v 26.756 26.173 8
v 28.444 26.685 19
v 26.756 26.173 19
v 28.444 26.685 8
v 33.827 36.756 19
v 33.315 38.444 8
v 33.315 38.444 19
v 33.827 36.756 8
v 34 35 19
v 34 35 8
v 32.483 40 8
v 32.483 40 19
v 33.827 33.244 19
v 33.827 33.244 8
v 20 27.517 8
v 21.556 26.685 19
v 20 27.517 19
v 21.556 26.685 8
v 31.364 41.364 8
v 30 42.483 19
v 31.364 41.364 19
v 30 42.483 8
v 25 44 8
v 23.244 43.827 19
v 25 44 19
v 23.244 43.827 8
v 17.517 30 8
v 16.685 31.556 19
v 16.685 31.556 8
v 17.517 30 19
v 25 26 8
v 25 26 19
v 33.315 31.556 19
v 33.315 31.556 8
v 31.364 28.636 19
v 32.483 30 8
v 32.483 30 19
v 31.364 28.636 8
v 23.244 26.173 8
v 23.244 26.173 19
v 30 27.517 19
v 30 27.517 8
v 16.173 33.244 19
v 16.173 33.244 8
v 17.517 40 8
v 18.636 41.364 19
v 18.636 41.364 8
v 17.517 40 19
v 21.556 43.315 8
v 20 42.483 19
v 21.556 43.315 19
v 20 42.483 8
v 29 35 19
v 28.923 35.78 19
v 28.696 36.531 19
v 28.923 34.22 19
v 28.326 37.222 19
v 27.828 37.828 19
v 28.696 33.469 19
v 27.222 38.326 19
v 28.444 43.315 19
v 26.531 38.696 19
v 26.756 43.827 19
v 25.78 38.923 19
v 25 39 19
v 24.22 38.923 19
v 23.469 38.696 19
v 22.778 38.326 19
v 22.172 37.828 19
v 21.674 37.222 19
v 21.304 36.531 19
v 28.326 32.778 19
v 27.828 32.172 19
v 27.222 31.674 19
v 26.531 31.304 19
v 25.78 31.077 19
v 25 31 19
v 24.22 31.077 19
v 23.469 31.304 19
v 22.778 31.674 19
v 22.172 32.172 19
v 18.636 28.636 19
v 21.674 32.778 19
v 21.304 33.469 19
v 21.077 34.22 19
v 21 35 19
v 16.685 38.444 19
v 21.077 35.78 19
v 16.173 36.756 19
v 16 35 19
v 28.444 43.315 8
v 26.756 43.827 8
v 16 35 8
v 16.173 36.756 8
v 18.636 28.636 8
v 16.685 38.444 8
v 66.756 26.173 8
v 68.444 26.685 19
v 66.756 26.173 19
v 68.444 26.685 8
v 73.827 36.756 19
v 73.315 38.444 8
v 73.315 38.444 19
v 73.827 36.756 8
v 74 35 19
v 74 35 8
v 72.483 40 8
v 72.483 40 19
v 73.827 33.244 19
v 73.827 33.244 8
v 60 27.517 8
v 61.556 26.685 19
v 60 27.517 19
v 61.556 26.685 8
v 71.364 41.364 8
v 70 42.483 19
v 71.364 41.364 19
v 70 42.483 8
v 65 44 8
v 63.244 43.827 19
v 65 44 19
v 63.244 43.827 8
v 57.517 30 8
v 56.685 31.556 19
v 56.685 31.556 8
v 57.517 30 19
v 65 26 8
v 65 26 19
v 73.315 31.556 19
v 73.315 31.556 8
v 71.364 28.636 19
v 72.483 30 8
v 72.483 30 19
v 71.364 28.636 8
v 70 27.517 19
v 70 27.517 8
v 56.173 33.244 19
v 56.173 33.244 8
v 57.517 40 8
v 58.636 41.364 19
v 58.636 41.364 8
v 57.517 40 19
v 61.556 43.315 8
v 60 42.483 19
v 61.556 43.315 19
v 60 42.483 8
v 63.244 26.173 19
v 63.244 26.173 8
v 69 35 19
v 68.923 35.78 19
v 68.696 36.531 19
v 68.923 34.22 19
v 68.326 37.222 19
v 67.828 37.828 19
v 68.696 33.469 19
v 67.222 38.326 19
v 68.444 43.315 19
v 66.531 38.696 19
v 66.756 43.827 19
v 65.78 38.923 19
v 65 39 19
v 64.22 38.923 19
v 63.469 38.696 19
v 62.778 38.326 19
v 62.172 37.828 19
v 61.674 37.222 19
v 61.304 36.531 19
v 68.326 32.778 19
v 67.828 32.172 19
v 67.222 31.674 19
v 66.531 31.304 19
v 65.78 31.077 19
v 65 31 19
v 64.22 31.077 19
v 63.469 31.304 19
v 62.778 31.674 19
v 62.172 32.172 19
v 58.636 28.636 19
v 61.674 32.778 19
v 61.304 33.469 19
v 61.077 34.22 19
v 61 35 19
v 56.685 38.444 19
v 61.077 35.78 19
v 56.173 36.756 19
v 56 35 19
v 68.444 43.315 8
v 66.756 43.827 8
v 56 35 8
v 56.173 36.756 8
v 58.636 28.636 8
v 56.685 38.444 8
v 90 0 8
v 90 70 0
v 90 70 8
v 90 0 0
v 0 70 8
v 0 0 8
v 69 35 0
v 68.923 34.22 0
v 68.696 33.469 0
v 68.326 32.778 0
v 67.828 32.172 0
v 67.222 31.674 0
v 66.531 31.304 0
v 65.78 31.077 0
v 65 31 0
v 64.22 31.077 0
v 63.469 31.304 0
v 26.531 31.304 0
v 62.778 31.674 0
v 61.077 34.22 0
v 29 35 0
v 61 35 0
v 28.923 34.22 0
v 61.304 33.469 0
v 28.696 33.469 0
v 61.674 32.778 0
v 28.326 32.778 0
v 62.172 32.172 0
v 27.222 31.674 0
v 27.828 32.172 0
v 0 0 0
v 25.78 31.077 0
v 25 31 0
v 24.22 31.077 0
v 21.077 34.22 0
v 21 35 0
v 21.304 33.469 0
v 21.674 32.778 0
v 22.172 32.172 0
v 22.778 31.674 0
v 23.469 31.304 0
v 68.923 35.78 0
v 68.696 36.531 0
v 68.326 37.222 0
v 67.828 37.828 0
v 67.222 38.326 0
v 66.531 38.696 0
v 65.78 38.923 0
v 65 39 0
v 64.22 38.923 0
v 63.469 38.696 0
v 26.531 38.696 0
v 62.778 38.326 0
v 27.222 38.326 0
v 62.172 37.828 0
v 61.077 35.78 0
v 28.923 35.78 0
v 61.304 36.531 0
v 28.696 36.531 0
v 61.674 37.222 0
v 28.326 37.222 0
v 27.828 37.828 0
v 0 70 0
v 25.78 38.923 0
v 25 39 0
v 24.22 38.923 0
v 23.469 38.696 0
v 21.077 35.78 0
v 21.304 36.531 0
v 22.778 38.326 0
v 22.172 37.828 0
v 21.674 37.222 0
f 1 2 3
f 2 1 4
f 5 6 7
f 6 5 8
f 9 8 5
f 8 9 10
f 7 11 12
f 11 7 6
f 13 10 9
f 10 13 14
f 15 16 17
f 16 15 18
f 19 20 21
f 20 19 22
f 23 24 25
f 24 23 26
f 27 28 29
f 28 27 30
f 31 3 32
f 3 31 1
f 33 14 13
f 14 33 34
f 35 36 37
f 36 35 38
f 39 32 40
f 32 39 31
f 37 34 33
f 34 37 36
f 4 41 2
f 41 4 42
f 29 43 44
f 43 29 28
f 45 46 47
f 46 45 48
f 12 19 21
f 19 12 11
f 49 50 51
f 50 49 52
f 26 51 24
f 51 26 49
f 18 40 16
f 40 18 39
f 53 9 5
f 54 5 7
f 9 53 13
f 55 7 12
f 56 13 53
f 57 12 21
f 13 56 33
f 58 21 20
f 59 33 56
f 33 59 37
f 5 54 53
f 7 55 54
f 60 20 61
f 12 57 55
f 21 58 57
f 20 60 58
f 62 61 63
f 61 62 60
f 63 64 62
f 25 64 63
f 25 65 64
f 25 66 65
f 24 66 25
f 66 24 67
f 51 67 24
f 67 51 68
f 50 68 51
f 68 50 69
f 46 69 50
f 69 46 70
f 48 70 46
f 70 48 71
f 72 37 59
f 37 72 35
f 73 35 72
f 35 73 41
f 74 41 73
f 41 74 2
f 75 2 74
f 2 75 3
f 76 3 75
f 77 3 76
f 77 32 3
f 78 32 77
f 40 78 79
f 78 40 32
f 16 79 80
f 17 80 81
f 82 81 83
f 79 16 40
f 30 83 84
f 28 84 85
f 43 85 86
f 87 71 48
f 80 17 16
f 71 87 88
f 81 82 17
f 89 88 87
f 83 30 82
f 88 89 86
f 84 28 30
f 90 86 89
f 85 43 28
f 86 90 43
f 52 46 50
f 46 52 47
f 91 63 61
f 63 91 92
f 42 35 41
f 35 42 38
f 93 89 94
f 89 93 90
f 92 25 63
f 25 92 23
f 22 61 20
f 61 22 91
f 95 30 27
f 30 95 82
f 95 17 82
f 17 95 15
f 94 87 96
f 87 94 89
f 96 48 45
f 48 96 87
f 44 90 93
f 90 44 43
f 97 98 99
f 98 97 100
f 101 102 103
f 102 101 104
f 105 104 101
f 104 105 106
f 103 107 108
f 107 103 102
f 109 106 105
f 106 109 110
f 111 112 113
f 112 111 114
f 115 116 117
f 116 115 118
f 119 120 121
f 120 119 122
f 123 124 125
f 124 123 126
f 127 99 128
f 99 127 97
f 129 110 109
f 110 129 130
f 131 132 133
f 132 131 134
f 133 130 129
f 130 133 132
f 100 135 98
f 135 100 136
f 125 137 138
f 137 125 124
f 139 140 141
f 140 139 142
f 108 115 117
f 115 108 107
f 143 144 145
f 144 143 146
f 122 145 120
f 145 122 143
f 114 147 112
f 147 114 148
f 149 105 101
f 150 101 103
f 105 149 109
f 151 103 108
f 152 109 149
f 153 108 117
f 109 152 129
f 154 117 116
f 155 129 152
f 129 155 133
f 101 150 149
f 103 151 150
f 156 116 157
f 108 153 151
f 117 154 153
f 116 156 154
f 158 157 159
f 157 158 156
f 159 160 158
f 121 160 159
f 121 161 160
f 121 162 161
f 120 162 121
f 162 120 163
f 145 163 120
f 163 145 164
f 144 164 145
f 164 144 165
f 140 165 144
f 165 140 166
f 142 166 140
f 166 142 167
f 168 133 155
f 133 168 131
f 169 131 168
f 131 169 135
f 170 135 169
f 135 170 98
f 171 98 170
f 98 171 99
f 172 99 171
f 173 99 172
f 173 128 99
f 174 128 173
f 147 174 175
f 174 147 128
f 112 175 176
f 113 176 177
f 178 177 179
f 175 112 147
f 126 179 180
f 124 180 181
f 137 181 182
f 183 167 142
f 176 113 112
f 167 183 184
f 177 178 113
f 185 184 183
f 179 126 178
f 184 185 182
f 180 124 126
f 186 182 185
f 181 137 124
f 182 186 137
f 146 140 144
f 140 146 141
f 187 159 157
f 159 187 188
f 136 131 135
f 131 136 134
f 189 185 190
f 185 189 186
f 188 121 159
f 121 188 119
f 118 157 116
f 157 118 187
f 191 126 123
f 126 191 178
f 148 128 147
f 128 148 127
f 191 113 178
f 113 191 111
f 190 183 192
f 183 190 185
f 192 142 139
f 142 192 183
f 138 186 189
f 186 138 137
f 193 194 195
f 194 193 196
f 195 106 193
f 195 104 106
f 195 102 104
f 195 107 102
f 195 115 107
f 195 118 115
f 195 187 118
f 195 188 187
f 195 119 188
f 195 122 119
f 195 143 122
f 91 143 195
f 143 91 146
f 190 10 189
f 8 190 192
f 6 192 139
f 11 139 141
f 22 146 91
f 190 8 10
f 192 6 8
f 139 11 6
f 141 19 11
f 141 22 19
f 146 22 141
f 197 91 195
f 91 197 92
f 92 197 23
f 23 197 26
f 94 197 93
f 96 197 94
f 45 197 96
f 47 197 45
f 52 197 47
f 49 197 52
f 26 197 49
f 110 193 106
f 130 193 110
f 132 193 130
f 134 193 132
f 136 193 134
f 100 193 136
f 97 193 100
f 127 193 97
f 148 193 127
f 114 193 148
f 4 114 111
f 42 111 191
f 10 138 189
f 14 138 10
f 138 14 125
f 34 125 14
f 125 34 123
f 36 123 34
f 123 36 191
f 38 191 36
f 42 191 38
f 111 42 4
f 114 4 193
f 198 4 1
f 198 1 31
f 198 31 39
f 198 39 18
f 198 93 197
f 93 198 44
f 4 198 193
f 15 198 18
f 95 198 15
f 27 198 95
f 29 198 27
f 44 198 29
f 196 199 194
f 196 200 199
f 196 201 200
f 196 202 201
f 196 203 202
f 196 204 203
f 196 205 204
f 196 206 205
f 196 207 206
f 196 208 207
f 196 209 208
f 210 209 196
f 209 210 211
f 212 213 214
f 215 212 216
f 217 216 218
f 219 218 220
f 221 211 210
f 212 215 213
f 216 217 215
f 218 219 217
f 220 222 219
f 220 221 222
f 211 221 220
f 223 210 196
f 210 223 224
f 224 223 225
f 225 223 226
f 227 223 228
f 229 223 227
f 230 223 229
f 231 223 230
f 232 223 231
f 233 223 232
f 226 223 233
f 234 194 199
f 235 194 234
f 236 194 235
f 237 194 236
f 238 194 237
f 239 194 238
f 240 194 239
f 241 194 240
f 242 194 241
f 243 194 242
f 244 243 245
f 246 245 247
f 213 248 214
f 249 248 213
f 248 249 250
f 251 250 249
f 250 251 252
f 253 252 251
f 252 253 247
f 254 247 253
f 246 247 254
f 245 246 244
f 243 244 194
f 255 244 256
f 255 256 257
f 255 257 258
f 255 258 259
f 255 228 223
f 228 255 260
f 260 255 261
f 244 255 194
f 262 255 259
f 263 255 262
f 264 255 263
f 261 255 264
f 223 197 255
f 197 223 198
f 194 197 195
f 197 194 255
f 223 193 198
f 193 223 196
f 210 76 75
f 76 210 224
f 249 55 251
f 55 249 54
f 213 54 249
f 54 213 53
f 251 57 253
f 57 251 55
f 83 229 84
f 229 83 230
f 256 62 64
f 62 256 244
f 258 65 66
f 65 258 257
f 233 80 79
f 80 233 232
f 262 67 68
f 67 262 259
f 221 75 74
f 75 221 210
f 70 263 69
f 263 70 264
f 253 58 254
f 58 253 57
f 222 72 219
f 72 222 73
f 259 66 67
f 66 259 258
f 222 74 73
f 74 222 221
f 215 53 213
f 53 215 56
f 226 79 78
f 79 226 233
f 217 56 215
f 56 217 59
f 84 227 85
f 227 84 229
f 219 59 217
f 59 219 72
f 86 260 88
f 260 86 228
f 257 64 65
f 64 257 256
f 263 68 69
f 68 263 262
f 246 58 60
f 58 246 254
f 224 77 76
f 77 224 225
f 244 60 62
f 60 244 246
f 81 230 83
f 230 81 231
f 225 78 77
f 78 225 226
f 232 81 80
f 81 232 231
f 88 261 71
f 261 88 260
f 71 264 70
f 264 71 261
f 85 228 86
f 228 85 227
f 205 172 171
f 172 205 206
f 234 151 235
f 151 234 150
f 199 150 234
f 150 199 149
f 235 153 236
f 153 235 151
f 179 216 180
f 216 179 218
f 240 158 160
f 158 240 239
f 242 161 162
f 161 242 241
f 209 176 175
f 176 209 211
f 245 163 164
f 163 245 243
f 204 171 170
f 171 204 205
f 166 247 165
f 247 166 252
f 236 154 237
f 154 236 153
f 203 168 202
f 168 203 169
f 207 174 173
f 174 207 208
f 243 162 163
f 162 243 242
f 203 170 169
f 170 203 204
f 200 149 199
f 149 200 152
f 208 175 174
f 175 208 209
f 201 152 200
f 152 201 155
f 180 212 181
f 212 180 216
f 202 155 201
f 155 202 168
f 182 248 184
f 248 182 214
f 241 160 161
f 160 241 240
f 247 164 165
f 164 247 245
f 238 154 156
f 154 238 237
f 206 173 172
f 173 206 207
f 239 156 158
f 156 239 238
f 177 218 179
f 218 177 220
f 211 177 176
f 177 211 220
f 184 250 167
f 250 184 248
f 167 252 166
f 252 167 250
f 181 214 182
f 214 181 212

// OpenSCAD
$fn = 32;

// ----------------------------------------------------------------------
// Drill jig: two_boss jig
// ----------------------------------------------------------------------

// --- parameters (mm) ---
plate_l = 90;             // plate length, X
plate_w = 70;             // plate width, Y
plate_t = 8;              // plate thickness
boss_d = 18;              // guide boss diameter
boss_h = 12;              // boss height above the plate
guide_d = 8;              // guide hole diameter
boss_pitch = 40;          // boss pitch

n_boss = 2;  // guide bosses
boss_x0 = (plate_l - (n_boss - 1) * boss_pitch) / 2;  // first boss X
boss_top = plate_t - 1 + boss_h;  // boss crown height
total_h = boss_top;  // overall height

difference() {
  union() {
  cube([plate_l, plate_w, plate_t]);
  for (i = [0 : n_boss - 1])
    translate([boss_x0 + i * boss_pitch, plate_w / 2, plate_t - 1])
      cylinder(h = boss_h, d = boss_d);
  }
  for (i = [0 : n_boss - 1])
    translate([boss_x0 + i * boss_pitch, plate_w / 2, -1])
      cylinder(h = plate_t + boss_h, d = guide_d);
}
